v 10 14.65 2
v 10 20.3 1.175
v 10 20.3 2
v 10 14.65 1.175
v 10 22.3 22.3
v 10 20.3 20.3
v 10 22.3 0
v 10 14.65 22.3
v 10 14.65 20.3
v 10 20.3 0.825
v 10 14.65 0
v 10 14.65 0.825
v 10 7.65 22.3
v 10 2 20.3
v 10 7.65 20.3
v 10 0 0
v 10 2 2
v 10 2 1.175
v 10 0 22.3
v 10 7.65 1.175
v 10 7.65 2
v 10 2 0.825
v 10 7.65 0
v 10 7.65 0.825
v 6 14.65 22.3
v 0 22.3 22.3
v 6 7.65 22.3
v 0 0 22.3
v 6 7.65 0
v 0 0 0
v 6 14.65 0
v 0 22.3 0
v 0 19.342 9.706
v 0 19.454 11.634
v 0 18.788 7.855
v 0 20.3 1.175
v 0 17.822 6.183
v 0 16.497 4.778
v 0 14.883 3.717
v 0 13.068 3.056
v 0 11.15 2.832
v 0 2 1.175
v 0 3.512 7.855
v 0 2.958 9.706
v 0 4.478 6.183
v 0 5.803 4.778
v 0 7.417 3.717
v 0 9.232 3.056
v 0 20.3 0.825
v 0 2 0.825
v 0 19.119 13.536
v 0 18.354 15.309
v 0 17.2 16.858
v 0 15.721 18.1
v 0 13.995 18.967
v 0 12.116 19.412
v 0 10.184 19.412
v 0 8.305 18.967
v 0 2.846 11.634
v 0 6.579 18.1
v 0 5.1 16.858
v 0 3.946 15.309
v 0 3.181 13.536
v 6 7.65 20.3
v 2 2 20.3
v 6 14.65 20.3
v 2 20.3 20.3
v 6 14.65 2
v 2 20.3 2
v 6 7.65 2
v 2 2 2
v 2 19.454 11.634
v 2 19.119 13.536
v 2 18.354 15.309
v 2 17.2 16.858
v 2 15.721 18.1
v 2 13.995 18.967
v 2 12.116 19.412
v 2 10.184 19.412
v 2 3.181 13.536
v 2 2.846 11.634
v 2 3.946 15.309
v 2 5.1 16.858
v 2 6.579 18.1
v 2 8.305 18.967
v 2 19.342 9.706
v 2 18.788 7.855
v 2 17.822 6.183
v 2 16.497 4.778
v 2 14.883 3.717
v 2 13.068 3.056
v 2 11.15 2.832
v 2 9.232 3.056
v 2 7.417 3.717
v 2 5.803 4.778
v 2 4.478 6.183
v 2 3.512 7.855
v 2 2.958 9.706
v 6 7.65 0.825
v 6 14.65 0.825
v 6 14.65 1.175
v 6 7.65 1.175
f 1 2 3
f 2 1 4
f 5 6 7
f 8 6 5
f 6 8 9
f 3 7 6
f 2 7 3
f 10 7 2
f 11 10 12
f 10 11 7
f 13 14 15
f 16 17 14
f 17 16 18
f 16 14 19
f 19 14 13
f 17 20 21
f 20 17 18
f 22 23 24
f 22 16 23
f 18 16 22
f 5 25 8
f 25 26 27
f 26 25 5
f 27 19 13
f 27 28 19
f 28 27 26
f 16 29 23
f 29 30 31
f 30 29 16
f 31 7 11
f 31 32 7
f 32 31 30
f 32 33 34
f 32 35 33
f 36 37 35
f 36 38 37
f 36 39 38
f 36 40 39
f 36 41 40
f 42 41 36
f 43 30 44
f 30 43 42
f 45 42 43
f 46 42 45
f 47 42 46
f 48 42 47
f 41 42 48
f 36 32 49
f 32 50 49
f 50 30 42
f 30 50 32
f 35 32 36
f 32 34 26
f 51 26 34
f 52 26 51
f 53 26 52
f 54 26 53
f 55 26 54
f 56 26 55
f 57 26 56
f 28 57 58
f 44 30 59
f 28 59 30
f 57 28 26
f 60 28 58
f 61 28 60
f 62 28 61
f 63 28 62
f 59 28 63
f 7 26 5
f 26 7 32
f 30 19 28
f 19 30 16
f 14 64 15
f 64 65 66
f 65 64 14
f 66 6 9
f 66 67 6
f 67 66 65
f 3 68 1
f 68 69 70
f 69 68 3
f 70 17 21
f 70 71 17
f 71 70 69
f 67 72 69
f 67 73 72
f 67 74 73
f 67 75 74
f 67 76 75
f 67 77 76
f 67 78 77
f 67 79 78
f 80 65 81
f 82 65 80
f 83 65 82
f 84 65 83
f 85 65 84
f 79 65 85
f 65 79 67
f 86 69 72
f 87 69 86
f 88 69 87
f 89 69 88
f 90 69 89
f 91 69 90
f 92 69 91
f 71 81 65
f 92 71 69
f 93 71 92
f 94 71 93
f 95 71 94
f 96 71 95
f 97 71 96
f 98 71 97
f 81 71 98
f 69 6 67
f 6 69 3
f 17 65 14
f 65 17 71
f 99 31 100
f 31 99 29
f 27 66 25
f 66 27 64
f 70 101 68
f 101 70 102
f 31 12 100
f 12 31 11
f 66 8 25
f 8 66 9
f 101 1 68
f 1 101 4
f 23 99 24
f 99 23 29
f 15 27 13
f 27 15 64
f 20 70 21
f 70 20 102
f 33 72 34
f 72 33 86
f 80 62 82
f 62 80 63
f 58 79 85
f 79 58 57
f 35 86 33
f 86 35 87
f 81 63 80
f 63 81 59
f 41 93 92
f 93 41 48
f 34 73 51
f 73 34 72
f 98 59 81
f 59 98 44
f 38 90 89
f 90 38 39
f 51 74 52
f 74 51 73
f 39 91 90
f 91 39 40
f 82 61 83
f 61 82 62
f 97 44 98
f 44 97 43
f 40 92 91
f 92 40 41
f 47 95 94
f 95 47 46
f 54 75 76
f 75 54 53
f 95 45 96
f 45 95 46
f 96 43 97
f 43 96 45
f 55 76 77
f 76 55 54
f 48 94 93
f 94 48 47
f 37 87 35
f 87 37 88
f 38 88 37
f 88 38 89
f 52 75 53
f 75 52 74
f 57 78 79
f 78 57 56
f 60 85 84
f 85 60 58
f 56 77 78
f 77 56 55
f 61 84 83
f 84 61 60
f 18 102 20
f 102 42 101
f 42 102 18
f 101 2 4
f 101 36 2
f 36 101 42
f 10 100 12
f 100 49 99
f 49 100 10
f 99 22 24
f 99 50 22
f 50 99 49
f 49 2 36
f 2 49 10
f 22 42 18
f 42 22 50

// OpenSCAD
w = 18.3; //18.3
d = 8; //8

difference(){
	cube([d+2,w+4,w+4]);

	translate([2,2,2]){
		cube([d,w,w]);
	}

	translate([d/2+2,w/2-1.5,0]){
		cube([d/2,7,60+w]);
	}

	translate([-1,(w+4)/2,(w+4)/2])rotate([0,90,0]){
		cylinder(r=w/2.2,h=5);
	}
	shim = .350;
	translate([0,2,(2-shim)/2])cube([42+d-2,w,shim]);

}
